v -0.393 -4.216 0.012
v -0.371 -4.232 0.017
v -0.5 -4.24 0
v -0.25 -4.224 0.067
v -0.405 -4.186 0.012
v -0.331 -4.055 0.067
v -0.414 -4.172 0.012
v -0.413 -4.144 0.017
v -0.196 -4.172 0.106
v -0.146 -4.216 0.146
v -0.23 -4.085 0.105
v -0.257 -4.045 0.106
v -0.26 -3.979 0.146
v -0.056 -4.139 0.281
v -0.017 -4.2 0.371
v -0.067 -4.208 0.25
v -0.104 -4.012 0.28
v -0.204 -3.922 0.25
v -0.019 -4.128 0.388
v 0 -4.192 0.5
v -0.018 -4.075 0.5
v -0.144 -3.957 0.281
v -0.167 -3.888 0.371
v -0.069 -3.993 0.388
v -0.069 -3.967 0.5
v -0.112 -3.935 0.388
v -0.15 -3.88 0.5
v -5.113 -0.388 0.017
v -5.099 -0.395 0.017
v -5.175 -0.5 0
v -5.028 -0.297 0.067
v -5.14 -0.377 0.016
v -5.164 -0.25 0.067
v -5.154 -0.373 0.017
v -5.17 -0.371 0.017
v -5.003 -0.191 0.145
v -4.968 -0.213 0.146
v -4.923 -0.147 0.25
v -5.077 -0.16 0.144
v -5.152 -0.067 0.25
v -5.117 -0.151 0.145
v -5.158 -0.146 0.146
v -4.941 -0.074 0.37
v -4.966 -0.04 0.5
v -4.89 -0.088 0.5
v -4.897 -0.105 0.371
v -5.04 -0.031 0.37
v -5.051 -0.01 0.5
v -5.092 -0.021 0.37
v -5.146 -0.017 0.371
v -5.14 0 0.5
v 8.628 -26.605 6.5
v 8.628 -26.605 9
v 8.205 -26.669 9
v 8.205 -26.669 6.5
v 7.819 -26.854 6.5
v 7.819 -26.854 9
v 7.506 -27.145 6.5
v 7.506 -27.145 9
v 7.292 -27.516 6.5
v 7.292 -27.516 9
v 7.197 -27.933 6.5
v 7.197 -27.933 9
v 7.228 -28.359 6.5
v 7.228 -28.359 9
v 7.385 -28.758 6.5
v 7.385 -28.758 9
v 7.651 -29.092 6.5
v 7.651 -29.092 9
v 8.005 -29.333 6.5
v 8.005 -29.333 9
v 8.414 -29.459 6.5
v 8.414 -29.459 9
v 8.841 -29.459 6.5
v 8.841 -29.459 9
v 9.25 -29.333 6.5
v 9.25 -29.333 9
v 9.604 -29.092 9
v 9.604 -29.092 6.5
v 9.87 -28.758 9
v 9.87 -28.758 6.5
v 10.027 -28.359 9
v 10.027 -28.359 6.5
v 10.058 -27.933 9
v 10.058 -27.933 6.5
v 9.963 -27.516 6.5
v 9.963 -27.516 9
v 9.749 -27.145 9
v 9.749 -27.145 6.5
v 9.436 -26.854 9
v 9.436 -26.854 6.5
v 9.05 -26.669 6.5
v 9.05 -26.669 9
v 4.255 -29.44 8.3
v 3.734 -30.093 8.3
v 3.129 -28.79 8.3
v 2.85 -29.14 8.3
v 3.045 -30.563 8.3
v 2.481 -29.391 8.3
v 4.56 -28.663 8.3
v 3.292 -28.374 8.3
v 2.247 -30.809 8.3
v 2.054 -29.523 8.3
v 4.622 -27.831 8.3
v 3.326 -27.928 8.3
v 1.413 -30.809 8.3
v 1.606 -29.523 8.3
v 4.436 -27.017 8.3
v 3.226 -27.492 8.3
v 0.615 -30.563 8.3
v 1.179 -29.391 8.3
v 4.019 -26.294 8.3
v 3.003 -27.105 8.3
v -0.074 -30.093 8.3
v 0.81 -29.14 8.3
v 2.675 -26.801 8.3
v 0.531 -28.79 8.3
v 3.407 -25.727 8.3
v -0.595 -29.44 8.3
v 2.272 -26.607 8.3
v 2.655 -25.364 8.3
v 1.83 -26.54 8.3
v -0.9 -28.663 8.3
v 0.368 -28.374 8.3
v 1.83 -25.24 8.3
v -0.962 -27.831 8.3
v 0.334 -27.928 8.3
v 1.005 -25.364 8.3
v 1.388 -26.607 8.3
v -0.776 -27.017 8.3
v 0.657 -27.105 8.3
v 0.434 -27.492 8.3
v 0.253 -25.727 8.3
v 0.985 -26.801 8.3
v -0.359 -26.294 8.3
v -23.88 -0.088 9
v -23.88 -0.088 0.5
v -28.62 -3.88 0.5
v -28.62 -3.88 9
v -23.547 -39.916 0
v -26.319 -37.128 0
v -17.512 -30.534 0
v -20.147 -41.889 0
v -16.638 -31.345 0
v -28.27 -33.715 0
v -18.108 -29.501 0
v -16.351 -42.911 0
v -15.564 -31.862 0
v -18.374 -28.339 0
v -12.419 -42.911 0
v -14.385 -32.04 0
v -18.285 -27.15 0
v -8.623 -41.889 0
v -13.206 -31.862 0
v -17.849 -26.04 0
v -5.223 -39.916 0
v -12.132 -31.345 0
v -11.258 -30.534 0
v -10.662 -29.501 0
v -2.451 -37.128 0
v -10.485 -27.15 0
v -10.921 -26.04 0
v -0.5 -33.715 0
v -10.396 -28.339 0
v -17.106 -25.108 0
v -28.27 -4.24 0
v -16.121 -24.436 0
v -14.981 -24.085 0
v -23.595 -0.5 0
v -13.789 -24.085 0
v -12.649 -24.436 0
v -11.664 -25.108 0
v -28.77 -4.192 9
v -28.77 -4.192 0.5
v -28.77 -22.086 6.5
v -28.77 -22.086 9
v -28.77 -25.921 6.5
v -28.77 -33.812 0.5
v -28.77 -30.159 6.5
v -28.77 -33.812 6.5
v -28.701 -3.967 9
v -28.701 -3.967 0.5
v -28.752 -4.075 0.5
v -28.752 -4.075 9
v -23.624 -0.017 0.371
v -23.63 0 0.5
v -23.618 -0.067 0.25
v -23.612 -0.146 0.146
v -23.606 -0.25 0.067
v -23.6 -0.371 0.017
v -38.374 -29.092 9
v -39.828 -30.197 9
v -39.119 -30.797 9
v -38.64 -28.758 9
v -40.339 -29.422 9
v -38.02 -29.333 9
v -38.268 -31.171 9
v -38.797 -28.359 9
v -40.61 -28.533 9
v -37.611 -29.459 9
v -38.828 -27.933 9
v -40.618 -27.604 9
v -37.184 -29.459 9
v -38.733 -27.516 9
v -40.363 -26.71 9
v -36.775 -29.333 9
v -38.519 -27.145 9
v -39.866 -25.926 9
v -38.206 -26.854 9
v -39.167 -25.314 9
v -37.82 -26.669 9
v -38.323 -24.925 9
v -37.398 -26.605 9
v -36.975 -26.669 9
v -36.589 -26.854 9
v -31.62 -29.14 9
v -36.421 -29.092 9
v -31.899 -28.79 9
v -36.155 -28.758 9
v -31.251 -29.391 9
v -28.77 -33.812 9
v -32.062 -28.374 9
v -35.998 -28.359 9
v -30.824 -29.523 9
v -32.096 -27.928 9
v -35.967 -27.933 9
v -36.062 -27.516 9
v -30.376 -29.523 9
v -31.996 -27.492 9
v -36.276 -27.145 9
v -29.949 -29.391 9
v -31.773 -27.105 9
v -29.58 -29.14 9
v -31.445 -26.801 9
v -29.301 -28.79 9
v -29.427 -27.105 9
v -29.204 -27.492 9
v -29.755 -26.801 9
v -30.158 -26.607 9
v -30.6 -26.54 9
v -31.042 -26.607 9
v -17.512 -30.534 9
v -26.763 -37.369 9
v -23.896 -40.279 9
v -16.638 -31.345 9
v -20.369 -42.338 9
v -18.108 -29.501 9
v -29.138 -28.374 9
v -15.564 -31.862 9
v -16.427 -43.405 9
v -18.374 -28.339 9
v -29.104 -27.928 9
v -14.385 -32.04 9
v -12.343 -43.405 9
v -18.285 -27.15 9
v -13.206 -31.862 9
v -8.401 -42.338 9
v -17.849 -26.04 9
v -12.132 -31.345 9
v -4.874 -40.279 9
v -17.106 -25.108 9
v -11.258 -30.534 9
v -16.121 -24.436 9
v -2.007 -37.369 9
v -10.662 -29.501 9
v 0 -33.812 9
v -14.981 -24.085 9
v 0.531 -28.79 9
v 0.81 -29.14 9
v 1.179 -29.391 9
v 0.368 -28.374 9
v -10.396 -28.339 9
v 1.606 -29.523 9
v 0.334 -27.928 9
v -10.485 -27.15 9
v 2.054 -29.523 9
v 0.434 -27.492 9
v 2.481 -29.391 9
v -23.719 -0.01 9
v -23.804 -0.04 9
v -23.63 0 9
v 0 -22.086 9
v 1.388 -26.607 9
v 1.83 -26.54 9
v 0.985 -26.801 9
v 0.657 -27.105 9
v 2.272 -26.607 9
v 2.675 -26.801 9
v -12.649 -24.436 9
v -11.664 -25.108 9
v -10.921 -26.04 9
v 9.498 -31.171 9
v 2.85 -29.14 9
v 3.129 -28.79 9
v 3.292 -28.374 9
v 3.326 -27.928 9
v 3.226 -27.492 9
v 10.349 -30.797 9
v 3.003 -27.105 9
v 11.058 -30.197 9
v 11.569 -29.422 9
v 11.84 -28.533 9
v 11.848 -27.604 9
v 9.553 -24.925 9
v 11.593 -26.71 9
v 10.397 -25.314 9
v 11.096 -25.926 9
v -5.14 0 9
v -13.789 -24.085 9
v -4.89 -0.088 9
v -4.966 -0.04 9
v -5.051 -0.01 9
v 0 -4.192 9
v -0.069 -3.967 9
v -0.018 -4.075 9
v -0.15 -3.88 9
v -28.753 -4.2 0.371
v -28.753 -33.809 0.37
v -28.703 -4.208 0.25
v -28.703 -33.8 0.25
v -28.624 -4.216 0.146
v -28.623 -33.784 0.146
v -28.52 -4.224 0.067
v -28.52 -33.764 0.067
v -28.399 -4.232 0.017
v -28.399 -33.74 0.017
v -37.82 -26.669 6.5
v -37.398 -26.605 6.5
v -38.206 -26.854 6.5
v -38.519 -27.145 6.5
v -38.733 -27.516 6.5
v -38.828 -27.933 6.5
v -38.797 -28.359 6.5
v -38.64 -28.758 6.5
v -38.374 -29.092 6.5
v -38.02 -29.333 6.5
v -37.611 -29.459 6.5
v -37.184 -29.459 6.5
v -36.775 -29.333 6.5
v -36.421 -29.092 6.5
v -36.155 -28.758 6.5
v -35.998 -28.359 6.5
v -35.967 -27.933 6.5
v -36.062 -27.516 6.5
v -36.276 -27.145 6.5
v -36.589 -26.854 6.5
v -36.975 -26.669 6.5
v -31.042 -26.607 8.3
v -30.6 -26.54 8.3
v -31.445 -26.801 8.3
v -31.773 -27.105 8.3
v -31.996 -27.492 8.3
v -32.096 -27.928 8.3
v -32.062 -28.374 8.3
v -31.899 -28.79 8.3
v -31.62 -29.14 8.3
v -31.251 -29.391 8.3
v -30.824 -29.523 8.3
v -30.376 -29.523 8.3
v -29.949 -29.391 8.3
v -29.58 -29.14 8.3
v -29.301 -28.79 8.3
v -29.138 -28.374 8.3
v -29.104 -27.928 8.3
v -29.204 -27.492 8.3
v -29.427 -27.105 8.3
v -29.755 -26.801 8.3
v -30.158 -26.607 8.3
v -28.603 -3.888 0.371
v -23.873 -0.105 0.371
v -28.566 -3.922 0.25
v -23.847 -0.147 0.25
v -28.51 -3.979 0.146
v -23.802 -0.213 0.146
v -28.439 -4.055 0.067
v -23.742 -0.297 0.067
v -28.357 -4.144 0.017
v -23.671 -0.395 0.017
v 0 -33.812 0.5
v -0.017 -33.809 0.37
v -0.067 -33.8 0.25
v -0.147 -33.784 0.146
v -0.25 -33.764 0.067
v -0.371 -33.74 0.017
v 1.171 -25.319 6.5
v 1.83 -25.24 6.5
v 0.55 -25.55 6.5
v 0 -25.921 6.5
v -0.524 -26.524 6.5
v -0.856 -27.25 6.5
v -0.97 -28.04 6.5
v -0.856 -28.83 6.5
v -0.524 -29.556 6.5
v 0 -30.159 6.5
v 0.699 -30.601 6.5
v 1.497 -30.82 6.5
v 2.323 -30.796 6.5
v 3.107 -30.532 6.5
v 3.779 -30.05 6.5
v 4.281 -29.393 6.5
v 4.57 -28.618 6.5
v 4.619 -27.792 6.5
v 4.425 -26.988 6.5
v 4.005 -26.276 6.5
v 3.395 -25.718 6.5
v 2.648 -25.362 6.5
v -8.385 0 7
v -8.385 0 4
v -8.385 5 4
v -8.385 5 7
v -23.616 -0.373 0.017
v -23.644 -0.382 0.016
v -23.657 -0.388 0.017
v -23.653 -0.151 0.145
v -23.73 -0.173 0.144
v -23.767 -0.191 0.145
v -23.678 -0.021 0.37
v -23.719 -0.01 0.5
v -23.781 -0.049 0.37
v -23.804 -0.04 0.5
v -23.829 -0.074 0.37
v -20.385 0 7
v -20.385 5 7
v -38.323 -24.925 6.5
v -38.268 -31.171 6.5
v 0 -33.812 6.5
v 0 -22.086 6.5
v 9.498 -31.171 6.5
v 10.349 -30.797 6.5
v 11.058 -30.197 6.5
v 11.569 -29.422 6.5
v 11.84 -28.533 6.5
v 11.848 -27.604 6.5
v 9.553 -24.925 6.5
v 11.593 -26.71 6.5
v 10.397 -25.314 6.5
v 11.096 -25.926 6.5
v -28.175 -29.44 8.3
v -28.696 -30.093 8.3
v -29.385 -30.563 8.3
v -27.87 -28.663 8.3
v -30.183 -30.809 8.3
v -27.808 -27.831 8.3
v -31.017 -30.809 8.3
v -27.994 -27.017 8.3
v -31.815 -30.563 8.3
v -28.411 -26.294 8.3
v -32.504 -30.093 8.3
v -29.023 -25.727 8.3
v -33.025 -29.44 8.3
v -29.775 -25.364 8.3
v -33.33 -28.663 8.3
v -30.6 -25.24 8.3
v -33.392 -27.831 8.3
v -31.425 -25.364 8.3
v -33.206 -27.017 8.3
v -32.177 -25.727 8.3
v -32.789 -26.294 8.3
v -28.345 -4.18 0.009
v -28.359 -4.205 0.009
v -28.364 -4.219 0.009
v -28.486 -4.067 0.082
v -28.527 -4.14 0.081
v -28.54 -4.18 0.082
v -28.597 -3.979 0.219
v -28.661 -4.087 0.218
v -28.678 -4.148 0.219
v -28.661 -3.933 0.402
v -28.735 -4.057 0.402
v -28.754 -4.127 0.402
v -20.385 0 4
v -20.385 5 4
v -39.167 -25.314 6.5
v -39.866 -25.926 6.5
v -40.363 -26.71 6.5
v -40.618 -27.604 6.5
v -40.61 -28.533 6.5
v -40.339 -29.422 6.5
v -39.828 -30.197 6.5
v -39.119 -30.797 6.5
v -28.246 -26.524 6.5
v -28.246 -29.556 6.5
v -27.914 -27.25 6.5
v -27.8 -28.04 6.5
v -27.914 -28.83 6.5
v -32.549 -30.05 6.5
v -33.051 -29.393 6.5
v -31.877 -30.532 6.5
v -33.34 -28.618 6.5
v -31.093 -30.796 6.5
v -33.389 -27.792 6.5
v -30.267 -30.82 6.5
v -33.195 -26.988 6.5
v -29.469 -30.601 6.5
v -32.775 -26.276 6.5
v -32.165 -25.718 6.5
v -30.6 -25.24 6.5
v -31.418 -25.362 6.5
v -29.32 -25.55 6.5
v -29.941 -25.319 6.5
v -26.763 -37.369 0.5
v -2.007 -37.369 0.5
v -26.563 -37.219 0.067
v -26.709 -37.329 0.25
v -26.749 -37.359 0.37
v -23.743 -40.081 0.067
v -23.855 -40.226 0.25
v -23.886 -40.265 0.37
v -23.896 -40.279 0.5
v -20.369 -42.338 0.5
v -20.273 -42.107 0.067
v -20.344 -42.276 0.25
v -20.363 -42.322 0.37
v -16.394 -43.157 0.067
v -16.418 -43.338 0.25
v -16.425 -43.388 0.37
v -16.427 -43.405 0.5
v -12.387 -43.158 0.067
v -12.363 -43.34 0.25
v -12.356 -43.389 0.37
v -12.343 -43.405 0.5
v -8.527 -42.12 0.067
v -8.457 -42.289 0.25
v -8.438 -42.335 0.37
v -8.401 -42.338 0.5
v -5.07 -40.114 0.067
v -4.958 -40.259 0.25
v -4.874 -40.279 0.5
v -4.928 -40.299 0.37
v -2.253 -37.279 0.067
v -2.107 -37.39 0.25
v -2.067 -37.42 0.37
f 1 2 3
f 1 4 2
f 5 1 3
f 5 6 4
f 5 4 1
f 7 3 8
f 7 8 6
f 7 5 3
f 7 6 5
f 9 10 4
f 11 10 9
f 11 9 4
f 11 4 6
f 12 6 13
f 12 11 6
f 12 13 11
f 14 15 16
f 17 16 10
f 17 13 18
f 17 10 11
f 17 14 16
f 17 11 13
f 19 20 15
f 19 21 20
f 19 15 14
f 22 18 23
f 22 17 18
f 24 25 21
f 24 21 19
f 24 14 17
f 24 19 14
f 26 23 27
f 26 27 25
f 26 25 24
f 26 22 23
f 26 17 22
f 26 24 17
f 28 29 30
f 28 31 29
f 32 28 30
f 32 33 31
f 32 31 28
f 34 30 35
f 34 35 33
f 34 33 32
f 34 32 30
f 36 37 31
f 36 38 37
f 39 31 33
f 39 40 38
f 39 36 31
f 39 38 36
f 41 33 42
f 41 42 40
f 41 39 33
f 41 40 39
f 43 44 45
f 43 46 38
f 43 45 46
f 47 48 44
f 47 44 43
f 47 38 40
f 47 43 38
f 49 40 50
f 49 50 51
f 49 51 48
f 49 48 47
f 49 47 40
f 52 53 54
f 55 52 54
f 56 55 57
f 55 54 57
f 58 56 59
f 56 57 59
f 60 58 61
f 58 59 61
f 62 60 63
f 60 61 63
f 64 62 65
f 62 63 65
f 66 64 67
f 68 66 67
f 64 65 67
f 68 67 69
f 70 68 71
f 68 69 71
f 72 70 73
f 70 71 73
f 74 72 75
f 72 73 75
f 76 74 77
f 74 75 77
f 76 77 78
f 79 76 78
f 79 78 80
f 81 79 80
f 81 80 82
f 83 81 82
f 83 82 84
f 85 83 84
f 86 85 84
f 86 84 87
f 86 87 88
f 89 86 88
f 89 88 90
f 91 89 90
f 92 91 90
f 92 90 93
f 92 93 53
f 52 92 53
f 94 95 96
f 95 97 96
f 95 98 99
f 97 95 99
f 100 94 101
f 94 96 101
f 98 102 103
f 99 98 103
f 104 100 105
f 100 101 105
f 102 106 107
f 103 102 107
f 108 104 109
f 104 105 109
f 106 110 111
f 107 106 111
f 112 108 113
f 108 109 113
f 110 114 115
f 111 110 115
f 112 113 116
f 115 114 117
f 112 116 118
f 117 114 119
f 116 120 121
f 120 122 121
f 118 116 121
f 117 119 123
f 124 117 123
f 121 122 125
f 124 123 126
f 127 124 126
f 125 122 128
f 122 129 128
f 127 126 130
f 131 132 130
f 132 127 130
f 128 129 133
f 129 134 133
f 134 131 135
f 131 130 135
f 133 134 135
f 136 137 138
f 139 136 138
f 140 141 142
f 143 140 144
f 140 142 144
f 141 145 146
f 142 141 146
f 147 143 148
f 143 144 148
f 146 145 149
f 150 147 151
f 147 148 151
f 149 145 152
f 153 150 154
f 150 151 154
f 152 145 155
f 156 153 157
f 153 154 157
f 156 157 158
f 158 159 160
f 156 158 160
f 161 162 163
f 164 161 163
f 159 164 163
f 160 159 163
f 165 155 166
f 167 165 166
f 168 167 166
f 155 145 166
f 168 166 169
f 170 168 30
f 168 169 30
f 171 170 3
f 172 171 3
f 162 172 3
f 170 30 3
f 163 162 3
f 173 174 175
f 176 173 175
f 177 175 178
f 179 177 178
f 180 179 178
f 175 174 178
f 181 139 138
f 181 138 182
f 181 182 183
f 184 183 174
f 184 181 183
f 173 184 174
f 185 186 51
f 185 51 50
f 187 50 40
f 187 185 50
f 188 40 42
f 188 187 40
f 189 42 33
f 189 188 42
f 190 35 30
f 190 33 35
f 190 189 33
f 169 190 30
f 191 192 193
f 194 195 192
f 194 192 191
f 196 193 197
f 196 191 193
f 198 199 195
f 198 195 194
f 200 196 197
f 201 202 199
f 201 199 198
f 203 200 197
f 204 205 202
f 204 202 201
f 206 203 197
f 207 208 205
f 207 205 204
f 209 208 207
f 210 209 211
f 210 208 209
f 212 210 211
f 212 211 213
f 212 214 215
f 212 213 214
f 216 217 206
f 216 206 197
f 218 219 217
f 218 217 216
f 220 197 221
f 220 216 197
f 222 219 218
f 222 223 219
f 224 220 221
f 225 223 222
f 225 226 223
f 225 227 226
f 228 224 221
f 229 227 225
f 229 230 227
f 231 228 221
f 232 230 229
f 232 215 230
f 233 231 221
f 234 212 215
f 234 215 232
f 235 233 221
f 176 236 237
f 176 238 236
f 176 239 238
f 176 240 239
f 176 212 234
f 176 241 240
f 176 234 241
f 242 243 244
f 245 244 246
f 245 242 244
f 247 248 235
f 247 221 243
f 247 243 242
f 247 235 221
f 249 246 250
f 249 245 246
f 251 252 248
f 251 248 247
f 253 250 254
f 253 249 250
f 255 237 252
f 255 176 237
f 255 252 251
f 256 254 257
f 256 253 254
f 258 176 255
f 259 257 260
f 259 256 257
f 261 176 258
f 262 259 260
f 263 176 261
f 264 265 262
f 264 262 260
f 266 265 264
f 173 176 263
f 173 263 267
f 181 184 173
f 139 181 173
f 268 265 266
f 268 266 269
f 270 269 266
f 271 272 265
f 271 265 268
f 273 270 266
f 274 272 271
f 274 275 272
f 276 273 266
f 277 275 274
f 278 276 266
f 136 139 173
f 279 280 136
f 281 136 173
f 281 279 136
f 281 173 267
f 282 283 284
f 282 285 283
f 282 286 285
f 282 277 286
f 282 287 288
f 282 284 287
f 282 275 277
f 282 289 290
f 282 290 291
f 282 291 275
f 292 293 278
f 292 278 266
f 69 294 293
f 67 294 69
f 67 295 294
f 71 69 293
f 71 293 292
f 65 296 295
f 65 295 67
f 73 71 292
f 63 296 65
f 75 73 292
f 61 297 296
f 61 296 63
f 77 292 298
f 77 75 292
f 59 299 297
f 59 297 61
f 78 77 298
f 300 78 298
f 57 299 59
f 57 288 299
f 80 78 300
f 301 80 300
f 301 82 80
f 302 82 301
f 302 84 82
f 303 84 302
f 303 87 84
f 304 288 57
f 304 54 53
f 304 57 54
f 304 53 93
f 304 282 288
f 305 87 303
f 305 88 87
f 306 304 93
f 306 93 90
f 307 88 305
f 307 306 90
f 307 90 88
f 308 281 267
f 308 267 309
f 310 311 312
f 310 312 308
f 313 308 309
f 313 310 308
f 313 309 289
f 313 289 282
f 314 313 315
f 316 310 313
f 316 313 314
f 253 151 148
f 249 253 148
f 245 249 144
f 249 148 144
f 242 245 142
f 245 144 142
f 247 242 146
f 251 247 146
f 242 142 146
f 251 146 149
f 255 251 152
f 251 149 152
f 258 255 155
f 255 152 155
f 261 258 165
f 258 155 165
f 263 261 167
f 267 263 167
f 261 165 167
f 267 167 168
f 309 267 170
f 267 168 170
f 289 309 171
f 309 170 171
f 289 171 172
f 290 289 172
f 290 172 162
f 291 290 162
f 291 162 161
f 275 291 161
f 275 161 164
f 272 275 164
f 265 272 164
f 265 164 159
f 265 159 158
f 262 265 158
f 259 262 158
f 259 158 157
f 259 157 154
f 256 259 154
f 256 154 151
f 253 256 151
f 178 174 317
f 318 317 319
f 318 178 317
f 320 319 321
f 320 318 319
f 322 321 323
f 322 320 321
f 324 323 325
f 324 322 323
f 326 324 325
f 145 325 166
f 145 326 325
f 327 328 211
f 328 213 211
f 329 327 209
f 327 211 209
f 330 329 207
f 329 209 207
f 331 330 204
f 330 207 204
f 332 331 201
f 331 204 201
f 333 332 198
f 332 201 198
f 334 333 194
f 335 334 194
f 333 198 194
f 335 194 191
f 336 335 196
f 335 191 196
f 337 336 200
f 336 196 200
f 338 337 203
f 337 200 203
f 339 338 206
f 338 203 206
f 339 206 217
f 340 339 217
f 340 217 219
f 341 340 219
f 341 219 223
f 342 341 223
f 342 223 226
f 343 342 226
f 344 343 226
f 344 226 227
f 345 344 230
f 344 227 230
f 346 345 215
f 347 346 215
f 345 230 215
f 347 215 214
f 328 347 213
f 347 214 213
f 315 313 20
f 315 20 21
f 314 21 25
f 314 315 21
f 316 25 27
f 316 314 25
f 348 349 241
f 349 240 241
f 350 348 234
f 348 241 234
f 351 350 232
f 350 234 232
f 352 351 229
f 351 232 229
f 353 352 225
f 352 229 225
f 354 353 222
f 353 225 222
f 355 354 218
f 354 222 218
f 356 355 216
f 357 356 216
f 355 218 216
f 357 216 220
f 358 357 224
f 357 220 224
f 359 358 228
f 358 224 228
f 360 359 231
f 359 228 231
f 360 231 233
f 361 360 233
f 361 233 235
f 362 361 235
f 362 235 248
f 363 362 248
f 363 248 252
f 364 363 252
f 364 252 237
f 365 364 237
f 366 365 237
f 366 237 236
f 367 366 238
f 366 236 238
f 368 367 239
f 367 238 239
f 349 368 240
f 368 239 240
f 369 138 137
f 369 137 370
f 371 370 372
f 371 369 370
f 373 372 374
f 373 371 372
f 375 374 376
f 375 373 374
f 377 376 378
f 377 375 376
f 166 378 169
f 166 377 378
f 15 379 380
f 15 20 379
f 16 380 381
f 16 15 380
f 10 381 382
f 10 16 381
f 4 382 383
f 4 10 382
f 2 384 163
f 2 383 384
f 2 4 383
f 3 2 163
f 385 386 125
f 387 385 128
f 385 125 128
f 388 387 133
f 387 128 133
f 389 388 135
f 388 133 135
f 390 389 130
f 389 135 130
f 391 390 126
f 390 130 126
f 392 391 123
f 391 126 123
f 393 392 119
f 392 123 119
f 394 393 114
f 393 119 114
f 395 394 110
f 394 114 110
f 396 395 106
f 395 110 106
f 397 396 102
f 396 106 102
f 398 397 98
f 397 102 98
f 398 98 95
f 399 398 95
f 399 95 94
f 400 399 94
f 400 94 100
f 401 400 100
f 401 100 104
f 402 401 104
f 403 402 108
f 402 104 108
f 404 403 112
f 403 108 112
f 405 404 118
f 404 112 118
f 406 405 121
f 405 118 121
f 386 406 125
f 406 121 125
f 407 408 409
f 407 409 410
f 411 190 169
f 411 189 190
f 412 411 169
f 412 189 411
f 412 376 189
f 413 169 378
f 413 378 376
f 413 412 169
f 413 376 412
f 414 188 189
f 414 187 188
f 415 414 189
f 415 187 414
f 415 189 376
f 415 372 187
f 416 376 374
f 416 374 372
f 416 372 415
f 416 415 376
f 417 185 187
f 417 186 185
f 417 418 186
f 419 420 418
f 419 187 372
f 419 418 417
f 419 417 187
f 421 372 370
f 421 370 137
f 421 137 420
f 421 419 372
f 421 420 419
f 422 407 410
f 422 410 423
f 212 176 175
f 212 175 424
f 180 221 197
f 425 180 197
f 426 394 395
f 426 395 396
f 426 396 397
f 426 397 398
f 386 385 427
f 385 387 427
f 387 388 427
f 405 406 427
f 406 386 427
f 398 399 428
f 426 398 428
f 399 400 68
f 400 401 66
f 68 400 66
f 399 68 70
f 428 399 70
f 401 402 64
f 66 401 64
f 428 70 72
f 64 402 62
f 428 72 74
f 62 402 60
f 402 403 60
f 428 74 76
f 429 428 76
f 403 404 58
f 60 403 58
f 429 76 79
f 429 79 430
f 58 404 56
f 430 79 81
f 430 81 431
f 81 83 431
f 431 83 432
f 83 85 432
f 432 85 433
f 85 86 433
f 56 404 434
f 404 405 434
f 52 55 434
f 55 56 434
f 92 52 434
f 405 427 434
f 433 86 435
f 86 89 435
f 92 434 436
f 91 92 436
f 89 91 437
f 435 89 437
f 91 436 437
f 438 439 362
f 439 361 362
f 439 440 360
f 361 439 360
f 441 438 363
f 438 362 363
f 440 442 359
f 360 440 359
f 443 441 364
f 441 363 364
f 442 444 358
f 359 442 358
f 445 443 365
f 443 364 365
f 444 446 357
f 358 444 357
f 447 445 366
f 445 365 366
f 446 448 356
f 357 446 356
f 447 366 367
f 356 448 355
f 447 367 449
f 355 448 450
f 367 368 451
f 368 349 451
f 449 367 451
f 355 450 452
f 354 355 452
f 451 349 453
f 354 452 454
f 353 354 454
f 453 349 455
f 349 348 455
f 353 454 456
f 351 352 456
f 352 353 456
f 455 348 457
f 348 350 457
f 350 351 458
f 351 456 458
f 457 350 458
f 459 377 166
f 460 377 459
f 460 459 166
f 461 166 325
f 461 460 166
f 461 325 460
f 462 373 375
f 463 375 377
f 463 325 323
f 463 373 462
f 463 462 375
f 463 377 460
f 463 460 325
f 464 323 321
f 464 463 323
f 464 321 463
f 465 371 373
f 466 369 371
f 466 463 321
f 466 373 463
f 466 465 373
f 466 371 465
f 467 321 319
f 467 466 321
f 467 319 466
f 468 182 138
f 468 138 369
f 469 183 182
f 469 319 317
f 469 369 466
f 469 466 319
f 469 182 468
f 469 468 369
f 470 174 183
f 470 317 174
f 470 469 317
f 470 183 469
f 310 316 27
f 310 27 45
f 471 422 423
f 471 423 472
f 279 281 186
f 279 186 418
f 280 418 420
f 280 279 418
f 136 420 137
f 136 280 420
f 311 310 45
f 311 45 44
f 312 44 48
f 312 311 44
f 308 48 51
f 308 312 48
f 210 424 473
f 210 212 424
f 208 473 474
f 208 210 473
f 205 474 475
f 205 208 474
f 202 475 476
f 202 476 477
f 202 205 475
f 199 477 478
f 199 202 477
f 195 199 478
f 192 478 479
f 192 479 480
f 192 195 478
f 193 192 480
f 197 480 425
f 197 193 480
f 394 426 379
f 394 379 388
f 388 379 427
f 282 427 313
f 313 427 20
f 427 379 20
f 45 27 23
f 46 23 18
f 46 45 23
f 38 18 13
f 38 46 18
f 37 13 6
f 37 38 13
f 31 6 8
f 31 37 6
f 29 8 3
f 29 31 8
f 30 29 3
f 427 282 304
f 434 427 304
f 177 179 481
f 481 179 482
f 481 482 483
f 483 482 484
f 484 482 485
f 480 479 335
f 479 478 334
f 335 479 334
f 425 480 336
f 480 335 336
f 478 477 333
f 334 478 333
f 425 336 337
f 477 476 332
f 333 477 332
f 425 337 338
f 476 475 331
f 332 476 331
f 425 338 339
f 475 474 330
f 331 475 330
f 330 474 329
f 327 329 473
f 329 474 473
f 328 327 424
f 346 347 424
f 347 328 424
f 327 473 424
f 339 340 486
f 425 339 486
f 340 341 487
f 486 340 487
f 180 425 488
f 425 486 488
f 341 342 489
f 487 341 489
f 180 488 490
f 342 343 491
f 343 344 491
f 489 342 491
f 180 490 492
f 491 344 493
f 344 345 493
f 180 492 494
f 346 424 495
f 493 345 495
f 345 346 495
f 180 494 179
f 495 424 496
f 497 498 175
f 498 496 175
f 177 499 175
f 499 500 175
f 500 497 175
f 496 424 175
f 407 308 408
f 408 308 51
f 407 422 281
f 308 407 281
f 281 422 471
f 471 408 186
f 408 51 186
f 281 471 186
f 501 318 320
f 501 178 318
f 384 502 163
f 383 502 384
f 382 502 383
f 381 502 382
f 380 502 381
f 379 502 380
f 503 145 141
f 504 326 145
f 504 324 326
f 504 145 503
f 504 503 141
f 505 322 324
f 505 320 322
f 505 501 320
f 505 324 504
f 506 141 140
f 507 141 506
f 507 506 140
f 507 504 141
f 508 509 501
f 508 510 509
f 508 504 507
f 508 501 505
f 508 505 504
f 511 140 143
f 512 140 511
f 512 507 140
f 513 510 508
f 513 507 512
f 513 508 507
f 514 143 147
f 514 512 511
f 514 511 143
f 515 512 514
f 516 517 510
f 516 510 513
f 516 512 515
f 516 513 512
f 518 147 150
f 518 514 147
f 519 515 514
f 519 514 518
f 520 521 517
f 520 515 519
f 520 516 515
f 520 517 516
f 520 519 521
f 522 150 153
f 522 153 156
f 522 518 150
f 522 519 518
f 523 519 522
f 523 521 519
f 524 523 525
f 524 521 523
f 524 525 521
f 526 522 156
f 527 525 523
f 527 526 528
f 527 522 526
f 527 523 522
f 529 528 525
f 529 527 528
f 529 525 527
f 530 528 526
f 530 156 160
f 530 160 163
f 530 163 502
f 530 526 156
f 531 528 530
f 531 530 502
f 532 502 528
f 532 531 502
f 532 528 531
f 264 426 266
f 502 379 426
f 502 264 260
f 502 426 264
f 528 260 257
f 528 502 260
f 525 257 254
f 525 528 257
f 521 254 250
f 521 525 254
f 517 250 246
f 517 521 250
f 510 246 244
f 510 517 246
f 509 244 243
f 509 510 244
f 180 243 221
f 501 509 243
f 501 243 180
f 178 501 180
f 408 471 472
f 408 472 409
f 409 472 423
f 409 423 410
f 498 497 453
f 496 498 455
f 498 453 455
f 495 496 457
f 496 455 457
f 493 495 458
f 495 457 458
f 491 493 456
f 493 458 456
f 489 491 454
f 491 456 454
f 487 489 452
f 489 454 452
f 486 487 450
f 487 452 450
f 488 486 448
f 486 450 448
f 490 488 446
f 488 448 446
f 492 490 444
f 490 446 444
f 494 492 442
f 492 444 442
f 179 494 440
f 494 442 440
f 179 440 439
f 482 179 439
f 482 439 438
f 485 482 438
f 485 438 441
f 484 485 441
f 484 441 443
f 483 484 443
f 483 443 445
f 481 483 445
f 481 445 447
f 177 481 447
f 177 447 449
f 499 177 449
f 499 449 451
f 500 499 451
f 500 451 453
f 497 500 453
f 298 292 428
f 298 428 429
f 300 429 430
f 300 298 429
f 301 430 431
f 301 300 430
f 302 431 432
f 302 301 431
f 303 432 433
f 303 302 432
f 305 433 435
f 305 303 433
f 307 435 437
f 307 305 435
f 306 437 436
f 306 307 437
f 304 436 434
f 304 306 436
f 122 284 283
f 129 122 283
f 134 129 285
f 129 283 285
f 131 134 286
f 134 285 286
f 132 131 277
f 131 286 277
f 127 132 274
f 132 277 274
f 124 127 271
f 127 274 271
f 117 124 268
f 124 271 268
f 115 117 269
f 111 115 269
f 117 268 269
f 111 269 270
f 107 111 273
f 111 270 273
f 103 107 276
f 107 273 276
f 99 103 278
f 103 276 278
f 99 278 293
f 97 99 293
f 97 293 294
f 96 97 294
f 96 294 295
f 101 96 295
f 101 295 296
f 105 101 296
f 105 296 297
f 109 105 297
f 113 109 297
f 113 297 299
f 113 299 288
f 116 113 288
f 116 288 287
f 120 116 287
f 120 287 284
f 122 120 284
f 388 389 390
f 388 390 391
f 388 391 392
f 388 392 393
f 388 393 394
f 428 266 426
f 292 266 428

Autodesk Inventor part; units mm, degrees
ref_plane "YZ Plane" through (0, 0, 0) normal (1, 0, 0) x (0, 1, 0)
ref_plane "XZ Plane" through (0, 0, 0) normal (0, 1, 0) x (-1, 0, 0)
ref_plane "XY Plane" through (0, 0, 0) normal (0, 0, 1) x (1, 0, 0)
sketch "スケッチ1" plane through (0, 0, 0) normal (0, 0, 1) x (1, 0, 0)
  line L0 (0, 0) -> (-28.77, 0)
  line L1 (-28.77, 0) -> (-28.77, -33.8125)
  line L2 (-28.77, -33.8125) -> (0, -33.8125)
  line L3 (0, -33.8125) -> (0, 0)
  circle A0 centre (-14.385, -28.04) radius 15.5
  line L4 (0, -4) -> (-5, 0)
  line L5 (-23.77, 0) -> (-28.77, -4)
  dimension "d0" = 28.77
  dimension "d2" = 31
  dimension "d4" = 4
  dimension "d5" = 4
  dimension "d6" = 5
  dimension "d7" = 5
  dimension "d66" = 28.04
extrude "押し出し1" add sketch "スケッチ1" along normal blind 9 contours L4 L3 A0 L1 L5 L0 | L3 L2 L1 A0 | A0 L2
sketch "スケッチ2" plane through (0, 0, 9) normal (0, 0, 1) x (1, 0, 0)
  line L0 (-5, 0) -> (-23.77, 0) projected
  arc A0 (-28.77, -33.8125) -> (0, -33.8125) centre (-14.385, -28.04) ccw projected
  point P0 (0, 0)
hole "穴1" at (-14.385, -28.04, 9) direction (0, 0, -1) diameter 8 end through all
sketch "スケッチ3" plane through (0, 0, 9) normal (0, 0, 1) x (1, 0, 0)
  line L0 (-28.77, -33.8125) -> (-38.2682, -31.1712)
  line L1 (-28.77, -22.086) -> (-38.3232, -24.9246)
  circle A0 centre (-37.3975, -28.04) radius 3.25
  circle A1 centre (-14.385, -28.04) radius 4 projected
  line L2 (0, -33.8125) -> (9.4982, -31.1712)
  line L3 (0, -22.086) -> (9.5532, -24.9246)
  circle A2 centre (8.6275, -28.04) radius 3.25
  line L4 (-28.77, -4) -> (-28.77, -33.8125) projected
  line L5 (0, -33.8125) -> (0, -4) projected
  point P0 (0, 0)
  dimension "d19" = 5.954
  dimension "d20" = 6.5
  dimension "d53" = 46.025
  dimension "d54" = 23.0125
  dimension "d55" = 6.5
extrude "押し出し2" add sketch "スケッチ3" against normal blind 2.5 contours L0 A0 L1 L4 | A0 | L5 L3 A2 L2 | A2
sketch "スケッチ4" plane through (0, 0, 6.5) normal (0, 0, -1) x (-1, 0, 0)
  arc A0 (0, -33.8125) -> (28.77, -33.8125) centre (14.385, -28.04) ccw projected
  point P0 (0, 0)
  point P1 (30.6, -28.04)
  point P2 (-1.83, -28.04)
  dimension "d26" = 16.215
  dimension "d27" = 16.215
hole "穴2" at (-30.6, -28.04, 6.5) at (1.83, -28.04, 6.5) direction (0, 0, 1) diameter 3 end through all
sketch "スケッチ5" plane through (0, 0, 6.5) normal (0, 0, -1) x (-1, 0, 0)
  circle A0 centre (30.6, -28.04) radius 1.5 projected
  circle A1 centre (-1.83, -28.04) radius 1.5 projected
  point P0 (0, 0)
hole "穴3" at (-30.6, -28.04, 6.5) at (1.83, -28.04, 6.5) direction (0, 0, 1) diameter 5.6 depth 1.8
sketch "スケッチ6" plane through (0, 0, 6.5) normal (0, 0, -1) x (-1, 0, 0)
  circle A0 centre (14.385, -28.04) radius 4 projected
  point P0 (0, 0)
  point P1 (37.3975, -28.04)
  point P2 (-8.6275, -28.04)
  dimension "d43" = 23.0125
  dimension "d45" = 23.0125
hole "穴4" at (-37.3975, -28.04, 6.5) at (8.6275, -28.04, 6.5) at (-14.385, -28.04, 6.5) direction (0, 0, 1) diameter 2.87 end through all
fillet "フィレット1" radius 0.4 4 edges at (-28.77, -4, 4.5) (-23.77, 0, 4.5) (-5, 0, 4.5) (0, -4, 4.5)
fillet "フィレット2" radius 0.5 10 edges at (-28.7305, -4.019, 0) (-26.2497, -1.9838, 0) (-23.7621, -0.0225, 0) (-14.385, 0, 0) (-5.0079, -0.0225, 0) (-2.5203, -1.9838, 0) (-0.0395, -4.019, 0) (0, -19.0024, 0) (-28.77, -19.0024, 0) (-14.385, -43.54, 0)
sketch "スケッチ7" plane through (-23.6297, 0, 9) normal (0, 1, 0) x (1, 0, 0)
  line L0 (3.2447, 5) -> (15.2447, 5)
  line L1 (15.2447, 5) -> (15.2447, 2)
  line L2 (15.2447, 2) -> (3.2447, 2)
  line L3 (3.2447, 2) -> (3.2447, 5)
  line L4 (18.4894, 0) -> (0, 0) projected
  point P0 (23.6297, 9)
  dimension "d60" = 3
  dimension "d61" = 12
  dimension "d62" = 8.385
  dimension "d63" = 2
extrude "押し出し3" add sketch "スケッチ7" along normal blind 5
equation "\"d4\" = d5"
equation "\"d6\" = d7"
equation "\"d54\" = 0.5 * d53"
equation "\"d55\" = d20"
equation "\"d27\" = d26"
equation "\"d45\" = d43"
equation "\"d62\" = -0.5 * d61 + 0.5 * d0"
properties part number "AMT102-V"
